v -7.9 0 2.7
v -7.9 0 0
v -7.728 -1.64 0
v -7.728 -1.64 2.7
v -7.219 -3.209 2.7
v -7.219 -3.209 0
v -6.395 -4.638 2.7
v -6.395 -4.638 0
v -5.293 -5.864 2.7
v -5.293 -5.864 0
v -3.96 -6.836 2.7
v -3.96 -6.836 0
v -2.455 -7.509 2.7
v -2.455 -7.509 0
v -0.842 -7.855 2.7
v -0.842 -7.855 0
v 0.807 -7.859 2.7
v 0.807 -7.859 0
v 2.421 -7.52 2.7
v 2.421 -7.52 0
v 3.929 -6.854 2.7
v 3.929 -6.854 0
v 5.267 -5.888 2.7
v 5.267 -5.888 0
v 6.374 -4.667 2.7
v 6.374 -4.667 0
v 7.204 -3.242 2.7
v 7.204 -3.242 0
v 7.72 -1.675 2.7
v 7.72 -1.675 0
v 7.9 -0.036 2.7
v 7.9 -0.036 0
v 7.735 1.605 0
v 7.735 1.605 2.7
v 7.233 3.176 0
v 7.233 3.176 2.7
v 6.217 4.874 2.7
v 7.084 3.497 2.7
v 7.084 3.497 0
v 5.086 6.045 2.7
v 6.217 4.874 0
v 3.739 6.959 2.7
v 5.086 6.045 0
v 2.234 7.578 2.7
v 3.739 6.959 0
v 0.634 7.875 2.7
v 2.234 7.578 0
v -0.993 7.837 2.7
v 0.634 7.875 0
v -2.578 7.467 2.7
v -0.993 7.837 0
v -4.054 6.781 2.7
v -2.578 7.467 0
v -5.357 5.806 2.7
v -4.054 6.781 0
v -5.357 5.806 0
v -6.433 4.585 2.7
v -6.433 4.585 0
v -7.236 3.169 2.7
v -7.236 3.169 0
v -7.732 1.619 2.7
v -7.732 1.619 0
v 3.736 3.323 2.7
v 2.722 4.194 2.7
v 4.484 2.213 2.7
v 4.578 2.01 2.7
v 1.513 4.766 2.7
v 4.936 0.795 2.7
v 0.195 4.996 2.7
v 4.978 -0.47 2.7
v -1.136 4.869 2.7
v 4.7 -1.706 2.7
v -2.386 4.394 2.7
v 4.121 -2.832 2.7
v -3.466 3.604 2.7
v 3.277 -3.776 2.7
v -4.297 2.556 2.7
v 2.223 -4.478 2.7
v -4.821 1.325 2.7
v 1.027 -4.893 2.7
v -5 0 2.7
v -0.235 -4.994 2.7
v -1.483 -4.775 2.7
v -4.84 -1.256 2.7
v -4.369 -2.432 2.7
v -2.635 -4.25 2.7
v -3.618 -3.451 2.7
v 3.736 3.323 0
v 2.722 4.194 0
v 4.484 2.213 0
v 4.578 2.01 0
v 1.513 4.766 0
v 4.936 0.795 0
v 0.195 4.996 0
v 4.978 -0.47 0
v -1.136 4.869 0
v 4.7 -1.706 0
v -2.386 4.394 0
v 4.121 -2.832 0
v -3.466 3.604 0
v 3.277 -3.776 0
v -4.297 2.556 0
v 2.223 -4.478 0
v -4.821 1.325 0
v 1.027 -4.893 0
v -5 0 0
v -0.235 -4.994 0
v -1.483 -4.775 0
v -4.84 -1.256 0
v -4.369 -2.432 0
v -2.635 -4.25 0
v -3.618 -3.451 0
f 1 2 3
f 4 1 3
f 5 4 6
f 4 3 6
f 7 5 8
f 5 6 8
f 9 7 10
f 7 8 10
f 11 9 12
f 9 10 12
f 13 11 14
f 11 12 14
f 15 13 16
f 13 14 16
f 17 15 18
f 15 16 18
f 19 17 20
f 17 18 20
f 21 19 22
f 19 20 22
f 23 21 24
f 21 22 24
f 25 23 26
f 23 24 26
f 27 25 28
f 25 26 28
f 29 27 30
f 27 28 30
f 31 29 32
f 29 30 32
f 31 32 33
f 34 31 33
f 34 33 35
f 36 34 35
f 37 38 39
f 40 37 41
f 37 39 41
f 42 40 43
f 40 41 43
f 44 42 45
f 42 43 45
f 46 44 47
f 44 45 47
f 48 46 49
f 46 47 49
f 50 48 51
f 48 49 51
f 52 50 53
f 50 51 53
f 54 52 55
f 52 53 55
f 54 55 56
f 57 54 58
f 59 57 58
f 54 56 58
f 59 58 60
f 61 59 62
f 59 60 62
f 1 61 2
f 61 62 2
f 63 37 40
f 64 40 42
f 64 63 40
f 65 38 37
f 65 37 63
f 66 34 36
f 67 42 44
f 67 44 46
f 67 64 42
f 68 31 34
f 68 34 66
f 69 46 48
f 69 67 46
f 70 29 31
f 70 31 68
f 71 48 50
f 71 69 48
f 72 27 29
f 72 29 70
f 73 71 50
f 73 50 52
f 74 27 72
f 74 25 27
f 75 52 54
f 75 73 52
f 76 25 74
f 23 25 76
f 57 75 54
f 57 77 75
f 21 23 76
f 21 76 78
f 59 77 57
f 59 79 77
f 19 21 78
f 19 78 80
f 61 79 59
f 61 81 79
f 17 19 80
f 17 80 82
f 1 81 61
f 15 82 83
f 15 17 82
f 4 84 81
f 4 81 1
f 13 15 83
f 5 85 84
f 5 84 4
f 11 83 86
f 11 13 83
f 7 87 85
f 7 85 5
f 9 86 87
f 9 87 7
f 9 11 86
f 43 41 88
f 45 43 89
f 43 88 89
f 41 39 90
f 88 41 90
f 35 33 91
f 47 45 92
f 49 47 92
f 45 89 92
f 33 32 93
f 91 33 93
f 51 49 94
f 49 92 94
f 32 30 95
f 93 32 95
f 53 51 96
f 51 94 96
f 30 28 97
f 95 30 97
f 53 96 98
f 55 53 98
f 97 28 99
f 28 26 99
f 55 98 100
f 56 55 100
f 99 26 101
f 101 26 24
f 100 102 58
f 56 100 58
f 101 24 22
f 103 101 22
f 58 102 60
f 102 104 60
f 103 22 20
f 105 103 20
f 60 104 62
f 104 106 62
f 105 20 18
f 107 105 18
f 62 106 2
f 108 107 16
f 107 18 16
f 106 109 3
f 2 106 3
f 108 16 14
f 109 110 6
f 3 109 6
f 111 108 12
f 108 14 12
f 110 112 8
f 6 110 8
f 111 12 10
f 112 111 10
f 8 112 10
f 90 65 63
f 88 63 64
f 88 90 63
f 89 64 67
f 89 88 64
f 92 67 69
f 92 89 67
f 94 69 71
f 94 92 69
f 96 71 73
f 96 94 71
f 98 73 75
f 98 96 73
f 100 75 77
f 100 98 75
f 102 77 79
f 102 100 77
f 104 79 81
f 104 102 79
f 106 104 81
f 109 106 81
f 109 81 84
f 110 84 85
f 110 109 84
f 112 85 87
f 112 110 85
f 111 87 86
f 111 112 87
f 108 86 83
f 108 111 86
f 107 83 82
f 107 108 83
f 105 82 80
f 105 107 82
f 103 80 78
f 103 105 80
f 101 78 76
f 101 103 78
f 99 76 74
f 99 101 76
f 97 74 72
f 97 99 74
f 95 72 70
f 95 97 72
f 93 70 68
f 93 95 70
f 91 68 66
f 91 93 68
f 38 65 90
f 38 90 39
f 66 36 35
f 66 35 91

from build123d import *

# Parameters (mm, degrees)
SKETCH_1_R          = 7.9
SKETCH_1_R_2        = 5
EXTRUDE_1_DEPTH     = 2.7
CUT_EXTRUDE_1_DEPTH = 10


with BuildPart() as part:
    # 草图1 → 凸台-拉伸1 (new body)
    with BuildSketch(Plane.XY):
        with Locations(Location((0, 0, 0), (0, 0, 180))):
            Circle(SKETCH_1_R)
        with Locations(Location((0, 0, 0), (0, 0, 180))):
            Circle(SKETCH_1_R_2, mode=Mode.SUBTRACT)
    extrude(amount=EXTRUDE_1_DEPTH)

    # 草图2 → 切除-拉伸1 (cut)
    with BuildSketch(Plane.XY.offset(2.7)):
        Polygon((0, 0), (8.171451681, 4.033670186), (8.171451681, 3.587869008), align=None)
    extrude(amount=-CUT_EXTRUDE_1_DEPTH, mode=Mode.SUBTRACT)


solid = part.part
